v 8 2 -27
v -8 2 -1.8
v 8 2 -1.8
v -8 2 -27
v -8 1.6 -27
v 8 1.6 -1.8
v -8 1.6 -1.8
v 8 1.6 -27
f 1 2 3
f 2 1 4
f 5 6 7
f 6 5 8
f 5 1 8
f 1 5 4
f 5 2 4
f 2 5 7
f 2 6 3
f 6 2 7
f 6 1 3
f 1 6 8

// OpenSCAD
// file: ../p/box.scad
use <../lib.scad>
function ldraw_lib__box() = [
// 0 Box 6 (six faces)
// 0 Name: box.dat
// 0 Author: James Jessiman
// 0 !LDRAW_ORG Primitive UPDATE 2002-05
// 0 !LICENSE Licensed under CC BY 2.0 and CC BY 4.0 : see CAreadme.txt
// 
// 0 BFC CERTIFY CCW
  [0,"BFC","CERTIFY"],
  [0,"BFC","CCW"],
// 
// 0 !HISTORY 2002-08-22 [sbliss] Applied BFC
// 0 !HISTORY 2002-11-30 [PTadmin] Official Update 2002-05
// 0 !HISTORY 2007-06-24 [PTadmin] Header formatted for Contributor Agreement
// 0 !HISTORY 2008-07-01 [PTadmin] Official Update 2008-01
// 
// 
// 2 24 1 1 1 -1 1 1
  [2,24,1,1,1,-1,1,1],
// 2 24 -1 1 1 -1 1 -1
  [2,24,-1,1,1,-1,1,-1],
// 2 24 -1 1 -1 1 1 -1
  [2,24,-1,1,-1,1,1,-1],
// 2 24 1 1 -1 1 1 1
  [2,24,1,1,-1,1,1,1],
// 2 24 1 -1 1 -1 -1 1
  [2,24,1,-1,1,-1,-1,1],
// 2 24 -1 -1 1 -1 -1 -1
  [2,24,-1,-1,1,-1,-1,-1],
// 2 24 -1 -1 -1 1 -1 -1
  [2,24,-1,-1,-1,1,-1,-1],
// 2 24 1 -1 -1 1 -1 1
  [2,24,1,-1,-1,1,-1,1],
// 2 24 1 -1 1 1 1 1
  [2,24,1,-1,1,1,1,1],
// 2 24 -1 -1 1 -1 1 1
  [2,24,-1,-1,1,-1,1,1],
// 2 24 1 -1 -1 1 1 -1
  [2,24,1,-1,-1,1,1,-1],
// 2 24 -1 -1 -1 -1 1 -1
  [2,24,-1,-1,-1,-1,1,-1],
// 4 16 1 1 1 1 1 -1 -1 1 -1 -1 1 1
  [4,16,1,1,1,1,1,-1,-1,1,-1,-1,1,1],
// 4 16 -1 -1 -1 1 -1 -1 1 -1 1 -1 -1 1
  [4,16,-1,-1,-1,1,-1,-1,1,-1,1,-1,-1,1],
// 4 16 -1 -1 1 1 -1 1 1 1 1 -1 1 1
  [4,16,-1,-1,1,1,-1,1,1,1,1,-1,1,1],
// 4 16 -1 -1 -1 -1 -1 1 -1 1 1 -1 1 -1
  [4,16,-1,-1,-1,-1,-1,1,-1,1,1,-1,1,-1],
// 4 16 1 -1 -1 -1 -1 -1 -1 1 -1 1 1 -1
  [4,16,1,-1,-1,-1,-1,-1,-1,1,-1,1,1,-1],
// 4 16 1 -1 1 1 -1 -1 1 1 -1 1 1 1
  [4,16,1,-1,1,1,-1,-1,1,1,-1,1,1,1],
// 0
];
module ldraw_lib__box(step=0, col=false, unit=2/5, alt=false, line=0.2, solid=!$preview)
    makepoly(ldraw_lib__box(), step=step, col=col, unit=unit, alt=alt, line=line, solid=solid);
ldraw_lib__box(line=0.2);
// main file
use <../lib.scad>
use <../p/box.scad>
function ldraw_lib__u8033() = [
// 0 ~Mursten Glass for Window Pane  1 x  2 x  3
// 0 Name: u8033.dat
// 0 Author: J.C. Tchang [tchang]
// 0 !LDRAW_ORG Part UPDATE 2019-02
// 0 !LICENSE Licensed under CC BY 2.0 and CC BY 4.0 : see CAreadme.txt
// 
// 0 BFC CERTIFY CW
  [0,"BFC","CERTIFY"],
  [0,"BFC","CW"],
// 
// 0 !CATEGORY Window
// 0 !KEYWORDS Automatic Binding Brick
// 
// 0 !CMDLINE -c47
// 
// 0 !HISTORY 2019-09-09 [PTadmin] Official Update 2019-02
// 
// 
// 1 16 0 36 4.5 20 0 0 0 0 31.5 0 0.5 0 box.dat
  [1,16,0,36,4.5,20,0,0,0,0,31.5,0,0.5,0, ldraw_lib__box()],
];
module ldraw_lib__u8033(step=0, col=false, unit=2/5, alt=false, line=0.2, solid=!$preview)
    makepoly(ldraw_lib__u8033(), step=step, col=col, unit=unit, alt=alt, line=line, solid=solid);
ldraw_lib__u8033(line=0.2);
